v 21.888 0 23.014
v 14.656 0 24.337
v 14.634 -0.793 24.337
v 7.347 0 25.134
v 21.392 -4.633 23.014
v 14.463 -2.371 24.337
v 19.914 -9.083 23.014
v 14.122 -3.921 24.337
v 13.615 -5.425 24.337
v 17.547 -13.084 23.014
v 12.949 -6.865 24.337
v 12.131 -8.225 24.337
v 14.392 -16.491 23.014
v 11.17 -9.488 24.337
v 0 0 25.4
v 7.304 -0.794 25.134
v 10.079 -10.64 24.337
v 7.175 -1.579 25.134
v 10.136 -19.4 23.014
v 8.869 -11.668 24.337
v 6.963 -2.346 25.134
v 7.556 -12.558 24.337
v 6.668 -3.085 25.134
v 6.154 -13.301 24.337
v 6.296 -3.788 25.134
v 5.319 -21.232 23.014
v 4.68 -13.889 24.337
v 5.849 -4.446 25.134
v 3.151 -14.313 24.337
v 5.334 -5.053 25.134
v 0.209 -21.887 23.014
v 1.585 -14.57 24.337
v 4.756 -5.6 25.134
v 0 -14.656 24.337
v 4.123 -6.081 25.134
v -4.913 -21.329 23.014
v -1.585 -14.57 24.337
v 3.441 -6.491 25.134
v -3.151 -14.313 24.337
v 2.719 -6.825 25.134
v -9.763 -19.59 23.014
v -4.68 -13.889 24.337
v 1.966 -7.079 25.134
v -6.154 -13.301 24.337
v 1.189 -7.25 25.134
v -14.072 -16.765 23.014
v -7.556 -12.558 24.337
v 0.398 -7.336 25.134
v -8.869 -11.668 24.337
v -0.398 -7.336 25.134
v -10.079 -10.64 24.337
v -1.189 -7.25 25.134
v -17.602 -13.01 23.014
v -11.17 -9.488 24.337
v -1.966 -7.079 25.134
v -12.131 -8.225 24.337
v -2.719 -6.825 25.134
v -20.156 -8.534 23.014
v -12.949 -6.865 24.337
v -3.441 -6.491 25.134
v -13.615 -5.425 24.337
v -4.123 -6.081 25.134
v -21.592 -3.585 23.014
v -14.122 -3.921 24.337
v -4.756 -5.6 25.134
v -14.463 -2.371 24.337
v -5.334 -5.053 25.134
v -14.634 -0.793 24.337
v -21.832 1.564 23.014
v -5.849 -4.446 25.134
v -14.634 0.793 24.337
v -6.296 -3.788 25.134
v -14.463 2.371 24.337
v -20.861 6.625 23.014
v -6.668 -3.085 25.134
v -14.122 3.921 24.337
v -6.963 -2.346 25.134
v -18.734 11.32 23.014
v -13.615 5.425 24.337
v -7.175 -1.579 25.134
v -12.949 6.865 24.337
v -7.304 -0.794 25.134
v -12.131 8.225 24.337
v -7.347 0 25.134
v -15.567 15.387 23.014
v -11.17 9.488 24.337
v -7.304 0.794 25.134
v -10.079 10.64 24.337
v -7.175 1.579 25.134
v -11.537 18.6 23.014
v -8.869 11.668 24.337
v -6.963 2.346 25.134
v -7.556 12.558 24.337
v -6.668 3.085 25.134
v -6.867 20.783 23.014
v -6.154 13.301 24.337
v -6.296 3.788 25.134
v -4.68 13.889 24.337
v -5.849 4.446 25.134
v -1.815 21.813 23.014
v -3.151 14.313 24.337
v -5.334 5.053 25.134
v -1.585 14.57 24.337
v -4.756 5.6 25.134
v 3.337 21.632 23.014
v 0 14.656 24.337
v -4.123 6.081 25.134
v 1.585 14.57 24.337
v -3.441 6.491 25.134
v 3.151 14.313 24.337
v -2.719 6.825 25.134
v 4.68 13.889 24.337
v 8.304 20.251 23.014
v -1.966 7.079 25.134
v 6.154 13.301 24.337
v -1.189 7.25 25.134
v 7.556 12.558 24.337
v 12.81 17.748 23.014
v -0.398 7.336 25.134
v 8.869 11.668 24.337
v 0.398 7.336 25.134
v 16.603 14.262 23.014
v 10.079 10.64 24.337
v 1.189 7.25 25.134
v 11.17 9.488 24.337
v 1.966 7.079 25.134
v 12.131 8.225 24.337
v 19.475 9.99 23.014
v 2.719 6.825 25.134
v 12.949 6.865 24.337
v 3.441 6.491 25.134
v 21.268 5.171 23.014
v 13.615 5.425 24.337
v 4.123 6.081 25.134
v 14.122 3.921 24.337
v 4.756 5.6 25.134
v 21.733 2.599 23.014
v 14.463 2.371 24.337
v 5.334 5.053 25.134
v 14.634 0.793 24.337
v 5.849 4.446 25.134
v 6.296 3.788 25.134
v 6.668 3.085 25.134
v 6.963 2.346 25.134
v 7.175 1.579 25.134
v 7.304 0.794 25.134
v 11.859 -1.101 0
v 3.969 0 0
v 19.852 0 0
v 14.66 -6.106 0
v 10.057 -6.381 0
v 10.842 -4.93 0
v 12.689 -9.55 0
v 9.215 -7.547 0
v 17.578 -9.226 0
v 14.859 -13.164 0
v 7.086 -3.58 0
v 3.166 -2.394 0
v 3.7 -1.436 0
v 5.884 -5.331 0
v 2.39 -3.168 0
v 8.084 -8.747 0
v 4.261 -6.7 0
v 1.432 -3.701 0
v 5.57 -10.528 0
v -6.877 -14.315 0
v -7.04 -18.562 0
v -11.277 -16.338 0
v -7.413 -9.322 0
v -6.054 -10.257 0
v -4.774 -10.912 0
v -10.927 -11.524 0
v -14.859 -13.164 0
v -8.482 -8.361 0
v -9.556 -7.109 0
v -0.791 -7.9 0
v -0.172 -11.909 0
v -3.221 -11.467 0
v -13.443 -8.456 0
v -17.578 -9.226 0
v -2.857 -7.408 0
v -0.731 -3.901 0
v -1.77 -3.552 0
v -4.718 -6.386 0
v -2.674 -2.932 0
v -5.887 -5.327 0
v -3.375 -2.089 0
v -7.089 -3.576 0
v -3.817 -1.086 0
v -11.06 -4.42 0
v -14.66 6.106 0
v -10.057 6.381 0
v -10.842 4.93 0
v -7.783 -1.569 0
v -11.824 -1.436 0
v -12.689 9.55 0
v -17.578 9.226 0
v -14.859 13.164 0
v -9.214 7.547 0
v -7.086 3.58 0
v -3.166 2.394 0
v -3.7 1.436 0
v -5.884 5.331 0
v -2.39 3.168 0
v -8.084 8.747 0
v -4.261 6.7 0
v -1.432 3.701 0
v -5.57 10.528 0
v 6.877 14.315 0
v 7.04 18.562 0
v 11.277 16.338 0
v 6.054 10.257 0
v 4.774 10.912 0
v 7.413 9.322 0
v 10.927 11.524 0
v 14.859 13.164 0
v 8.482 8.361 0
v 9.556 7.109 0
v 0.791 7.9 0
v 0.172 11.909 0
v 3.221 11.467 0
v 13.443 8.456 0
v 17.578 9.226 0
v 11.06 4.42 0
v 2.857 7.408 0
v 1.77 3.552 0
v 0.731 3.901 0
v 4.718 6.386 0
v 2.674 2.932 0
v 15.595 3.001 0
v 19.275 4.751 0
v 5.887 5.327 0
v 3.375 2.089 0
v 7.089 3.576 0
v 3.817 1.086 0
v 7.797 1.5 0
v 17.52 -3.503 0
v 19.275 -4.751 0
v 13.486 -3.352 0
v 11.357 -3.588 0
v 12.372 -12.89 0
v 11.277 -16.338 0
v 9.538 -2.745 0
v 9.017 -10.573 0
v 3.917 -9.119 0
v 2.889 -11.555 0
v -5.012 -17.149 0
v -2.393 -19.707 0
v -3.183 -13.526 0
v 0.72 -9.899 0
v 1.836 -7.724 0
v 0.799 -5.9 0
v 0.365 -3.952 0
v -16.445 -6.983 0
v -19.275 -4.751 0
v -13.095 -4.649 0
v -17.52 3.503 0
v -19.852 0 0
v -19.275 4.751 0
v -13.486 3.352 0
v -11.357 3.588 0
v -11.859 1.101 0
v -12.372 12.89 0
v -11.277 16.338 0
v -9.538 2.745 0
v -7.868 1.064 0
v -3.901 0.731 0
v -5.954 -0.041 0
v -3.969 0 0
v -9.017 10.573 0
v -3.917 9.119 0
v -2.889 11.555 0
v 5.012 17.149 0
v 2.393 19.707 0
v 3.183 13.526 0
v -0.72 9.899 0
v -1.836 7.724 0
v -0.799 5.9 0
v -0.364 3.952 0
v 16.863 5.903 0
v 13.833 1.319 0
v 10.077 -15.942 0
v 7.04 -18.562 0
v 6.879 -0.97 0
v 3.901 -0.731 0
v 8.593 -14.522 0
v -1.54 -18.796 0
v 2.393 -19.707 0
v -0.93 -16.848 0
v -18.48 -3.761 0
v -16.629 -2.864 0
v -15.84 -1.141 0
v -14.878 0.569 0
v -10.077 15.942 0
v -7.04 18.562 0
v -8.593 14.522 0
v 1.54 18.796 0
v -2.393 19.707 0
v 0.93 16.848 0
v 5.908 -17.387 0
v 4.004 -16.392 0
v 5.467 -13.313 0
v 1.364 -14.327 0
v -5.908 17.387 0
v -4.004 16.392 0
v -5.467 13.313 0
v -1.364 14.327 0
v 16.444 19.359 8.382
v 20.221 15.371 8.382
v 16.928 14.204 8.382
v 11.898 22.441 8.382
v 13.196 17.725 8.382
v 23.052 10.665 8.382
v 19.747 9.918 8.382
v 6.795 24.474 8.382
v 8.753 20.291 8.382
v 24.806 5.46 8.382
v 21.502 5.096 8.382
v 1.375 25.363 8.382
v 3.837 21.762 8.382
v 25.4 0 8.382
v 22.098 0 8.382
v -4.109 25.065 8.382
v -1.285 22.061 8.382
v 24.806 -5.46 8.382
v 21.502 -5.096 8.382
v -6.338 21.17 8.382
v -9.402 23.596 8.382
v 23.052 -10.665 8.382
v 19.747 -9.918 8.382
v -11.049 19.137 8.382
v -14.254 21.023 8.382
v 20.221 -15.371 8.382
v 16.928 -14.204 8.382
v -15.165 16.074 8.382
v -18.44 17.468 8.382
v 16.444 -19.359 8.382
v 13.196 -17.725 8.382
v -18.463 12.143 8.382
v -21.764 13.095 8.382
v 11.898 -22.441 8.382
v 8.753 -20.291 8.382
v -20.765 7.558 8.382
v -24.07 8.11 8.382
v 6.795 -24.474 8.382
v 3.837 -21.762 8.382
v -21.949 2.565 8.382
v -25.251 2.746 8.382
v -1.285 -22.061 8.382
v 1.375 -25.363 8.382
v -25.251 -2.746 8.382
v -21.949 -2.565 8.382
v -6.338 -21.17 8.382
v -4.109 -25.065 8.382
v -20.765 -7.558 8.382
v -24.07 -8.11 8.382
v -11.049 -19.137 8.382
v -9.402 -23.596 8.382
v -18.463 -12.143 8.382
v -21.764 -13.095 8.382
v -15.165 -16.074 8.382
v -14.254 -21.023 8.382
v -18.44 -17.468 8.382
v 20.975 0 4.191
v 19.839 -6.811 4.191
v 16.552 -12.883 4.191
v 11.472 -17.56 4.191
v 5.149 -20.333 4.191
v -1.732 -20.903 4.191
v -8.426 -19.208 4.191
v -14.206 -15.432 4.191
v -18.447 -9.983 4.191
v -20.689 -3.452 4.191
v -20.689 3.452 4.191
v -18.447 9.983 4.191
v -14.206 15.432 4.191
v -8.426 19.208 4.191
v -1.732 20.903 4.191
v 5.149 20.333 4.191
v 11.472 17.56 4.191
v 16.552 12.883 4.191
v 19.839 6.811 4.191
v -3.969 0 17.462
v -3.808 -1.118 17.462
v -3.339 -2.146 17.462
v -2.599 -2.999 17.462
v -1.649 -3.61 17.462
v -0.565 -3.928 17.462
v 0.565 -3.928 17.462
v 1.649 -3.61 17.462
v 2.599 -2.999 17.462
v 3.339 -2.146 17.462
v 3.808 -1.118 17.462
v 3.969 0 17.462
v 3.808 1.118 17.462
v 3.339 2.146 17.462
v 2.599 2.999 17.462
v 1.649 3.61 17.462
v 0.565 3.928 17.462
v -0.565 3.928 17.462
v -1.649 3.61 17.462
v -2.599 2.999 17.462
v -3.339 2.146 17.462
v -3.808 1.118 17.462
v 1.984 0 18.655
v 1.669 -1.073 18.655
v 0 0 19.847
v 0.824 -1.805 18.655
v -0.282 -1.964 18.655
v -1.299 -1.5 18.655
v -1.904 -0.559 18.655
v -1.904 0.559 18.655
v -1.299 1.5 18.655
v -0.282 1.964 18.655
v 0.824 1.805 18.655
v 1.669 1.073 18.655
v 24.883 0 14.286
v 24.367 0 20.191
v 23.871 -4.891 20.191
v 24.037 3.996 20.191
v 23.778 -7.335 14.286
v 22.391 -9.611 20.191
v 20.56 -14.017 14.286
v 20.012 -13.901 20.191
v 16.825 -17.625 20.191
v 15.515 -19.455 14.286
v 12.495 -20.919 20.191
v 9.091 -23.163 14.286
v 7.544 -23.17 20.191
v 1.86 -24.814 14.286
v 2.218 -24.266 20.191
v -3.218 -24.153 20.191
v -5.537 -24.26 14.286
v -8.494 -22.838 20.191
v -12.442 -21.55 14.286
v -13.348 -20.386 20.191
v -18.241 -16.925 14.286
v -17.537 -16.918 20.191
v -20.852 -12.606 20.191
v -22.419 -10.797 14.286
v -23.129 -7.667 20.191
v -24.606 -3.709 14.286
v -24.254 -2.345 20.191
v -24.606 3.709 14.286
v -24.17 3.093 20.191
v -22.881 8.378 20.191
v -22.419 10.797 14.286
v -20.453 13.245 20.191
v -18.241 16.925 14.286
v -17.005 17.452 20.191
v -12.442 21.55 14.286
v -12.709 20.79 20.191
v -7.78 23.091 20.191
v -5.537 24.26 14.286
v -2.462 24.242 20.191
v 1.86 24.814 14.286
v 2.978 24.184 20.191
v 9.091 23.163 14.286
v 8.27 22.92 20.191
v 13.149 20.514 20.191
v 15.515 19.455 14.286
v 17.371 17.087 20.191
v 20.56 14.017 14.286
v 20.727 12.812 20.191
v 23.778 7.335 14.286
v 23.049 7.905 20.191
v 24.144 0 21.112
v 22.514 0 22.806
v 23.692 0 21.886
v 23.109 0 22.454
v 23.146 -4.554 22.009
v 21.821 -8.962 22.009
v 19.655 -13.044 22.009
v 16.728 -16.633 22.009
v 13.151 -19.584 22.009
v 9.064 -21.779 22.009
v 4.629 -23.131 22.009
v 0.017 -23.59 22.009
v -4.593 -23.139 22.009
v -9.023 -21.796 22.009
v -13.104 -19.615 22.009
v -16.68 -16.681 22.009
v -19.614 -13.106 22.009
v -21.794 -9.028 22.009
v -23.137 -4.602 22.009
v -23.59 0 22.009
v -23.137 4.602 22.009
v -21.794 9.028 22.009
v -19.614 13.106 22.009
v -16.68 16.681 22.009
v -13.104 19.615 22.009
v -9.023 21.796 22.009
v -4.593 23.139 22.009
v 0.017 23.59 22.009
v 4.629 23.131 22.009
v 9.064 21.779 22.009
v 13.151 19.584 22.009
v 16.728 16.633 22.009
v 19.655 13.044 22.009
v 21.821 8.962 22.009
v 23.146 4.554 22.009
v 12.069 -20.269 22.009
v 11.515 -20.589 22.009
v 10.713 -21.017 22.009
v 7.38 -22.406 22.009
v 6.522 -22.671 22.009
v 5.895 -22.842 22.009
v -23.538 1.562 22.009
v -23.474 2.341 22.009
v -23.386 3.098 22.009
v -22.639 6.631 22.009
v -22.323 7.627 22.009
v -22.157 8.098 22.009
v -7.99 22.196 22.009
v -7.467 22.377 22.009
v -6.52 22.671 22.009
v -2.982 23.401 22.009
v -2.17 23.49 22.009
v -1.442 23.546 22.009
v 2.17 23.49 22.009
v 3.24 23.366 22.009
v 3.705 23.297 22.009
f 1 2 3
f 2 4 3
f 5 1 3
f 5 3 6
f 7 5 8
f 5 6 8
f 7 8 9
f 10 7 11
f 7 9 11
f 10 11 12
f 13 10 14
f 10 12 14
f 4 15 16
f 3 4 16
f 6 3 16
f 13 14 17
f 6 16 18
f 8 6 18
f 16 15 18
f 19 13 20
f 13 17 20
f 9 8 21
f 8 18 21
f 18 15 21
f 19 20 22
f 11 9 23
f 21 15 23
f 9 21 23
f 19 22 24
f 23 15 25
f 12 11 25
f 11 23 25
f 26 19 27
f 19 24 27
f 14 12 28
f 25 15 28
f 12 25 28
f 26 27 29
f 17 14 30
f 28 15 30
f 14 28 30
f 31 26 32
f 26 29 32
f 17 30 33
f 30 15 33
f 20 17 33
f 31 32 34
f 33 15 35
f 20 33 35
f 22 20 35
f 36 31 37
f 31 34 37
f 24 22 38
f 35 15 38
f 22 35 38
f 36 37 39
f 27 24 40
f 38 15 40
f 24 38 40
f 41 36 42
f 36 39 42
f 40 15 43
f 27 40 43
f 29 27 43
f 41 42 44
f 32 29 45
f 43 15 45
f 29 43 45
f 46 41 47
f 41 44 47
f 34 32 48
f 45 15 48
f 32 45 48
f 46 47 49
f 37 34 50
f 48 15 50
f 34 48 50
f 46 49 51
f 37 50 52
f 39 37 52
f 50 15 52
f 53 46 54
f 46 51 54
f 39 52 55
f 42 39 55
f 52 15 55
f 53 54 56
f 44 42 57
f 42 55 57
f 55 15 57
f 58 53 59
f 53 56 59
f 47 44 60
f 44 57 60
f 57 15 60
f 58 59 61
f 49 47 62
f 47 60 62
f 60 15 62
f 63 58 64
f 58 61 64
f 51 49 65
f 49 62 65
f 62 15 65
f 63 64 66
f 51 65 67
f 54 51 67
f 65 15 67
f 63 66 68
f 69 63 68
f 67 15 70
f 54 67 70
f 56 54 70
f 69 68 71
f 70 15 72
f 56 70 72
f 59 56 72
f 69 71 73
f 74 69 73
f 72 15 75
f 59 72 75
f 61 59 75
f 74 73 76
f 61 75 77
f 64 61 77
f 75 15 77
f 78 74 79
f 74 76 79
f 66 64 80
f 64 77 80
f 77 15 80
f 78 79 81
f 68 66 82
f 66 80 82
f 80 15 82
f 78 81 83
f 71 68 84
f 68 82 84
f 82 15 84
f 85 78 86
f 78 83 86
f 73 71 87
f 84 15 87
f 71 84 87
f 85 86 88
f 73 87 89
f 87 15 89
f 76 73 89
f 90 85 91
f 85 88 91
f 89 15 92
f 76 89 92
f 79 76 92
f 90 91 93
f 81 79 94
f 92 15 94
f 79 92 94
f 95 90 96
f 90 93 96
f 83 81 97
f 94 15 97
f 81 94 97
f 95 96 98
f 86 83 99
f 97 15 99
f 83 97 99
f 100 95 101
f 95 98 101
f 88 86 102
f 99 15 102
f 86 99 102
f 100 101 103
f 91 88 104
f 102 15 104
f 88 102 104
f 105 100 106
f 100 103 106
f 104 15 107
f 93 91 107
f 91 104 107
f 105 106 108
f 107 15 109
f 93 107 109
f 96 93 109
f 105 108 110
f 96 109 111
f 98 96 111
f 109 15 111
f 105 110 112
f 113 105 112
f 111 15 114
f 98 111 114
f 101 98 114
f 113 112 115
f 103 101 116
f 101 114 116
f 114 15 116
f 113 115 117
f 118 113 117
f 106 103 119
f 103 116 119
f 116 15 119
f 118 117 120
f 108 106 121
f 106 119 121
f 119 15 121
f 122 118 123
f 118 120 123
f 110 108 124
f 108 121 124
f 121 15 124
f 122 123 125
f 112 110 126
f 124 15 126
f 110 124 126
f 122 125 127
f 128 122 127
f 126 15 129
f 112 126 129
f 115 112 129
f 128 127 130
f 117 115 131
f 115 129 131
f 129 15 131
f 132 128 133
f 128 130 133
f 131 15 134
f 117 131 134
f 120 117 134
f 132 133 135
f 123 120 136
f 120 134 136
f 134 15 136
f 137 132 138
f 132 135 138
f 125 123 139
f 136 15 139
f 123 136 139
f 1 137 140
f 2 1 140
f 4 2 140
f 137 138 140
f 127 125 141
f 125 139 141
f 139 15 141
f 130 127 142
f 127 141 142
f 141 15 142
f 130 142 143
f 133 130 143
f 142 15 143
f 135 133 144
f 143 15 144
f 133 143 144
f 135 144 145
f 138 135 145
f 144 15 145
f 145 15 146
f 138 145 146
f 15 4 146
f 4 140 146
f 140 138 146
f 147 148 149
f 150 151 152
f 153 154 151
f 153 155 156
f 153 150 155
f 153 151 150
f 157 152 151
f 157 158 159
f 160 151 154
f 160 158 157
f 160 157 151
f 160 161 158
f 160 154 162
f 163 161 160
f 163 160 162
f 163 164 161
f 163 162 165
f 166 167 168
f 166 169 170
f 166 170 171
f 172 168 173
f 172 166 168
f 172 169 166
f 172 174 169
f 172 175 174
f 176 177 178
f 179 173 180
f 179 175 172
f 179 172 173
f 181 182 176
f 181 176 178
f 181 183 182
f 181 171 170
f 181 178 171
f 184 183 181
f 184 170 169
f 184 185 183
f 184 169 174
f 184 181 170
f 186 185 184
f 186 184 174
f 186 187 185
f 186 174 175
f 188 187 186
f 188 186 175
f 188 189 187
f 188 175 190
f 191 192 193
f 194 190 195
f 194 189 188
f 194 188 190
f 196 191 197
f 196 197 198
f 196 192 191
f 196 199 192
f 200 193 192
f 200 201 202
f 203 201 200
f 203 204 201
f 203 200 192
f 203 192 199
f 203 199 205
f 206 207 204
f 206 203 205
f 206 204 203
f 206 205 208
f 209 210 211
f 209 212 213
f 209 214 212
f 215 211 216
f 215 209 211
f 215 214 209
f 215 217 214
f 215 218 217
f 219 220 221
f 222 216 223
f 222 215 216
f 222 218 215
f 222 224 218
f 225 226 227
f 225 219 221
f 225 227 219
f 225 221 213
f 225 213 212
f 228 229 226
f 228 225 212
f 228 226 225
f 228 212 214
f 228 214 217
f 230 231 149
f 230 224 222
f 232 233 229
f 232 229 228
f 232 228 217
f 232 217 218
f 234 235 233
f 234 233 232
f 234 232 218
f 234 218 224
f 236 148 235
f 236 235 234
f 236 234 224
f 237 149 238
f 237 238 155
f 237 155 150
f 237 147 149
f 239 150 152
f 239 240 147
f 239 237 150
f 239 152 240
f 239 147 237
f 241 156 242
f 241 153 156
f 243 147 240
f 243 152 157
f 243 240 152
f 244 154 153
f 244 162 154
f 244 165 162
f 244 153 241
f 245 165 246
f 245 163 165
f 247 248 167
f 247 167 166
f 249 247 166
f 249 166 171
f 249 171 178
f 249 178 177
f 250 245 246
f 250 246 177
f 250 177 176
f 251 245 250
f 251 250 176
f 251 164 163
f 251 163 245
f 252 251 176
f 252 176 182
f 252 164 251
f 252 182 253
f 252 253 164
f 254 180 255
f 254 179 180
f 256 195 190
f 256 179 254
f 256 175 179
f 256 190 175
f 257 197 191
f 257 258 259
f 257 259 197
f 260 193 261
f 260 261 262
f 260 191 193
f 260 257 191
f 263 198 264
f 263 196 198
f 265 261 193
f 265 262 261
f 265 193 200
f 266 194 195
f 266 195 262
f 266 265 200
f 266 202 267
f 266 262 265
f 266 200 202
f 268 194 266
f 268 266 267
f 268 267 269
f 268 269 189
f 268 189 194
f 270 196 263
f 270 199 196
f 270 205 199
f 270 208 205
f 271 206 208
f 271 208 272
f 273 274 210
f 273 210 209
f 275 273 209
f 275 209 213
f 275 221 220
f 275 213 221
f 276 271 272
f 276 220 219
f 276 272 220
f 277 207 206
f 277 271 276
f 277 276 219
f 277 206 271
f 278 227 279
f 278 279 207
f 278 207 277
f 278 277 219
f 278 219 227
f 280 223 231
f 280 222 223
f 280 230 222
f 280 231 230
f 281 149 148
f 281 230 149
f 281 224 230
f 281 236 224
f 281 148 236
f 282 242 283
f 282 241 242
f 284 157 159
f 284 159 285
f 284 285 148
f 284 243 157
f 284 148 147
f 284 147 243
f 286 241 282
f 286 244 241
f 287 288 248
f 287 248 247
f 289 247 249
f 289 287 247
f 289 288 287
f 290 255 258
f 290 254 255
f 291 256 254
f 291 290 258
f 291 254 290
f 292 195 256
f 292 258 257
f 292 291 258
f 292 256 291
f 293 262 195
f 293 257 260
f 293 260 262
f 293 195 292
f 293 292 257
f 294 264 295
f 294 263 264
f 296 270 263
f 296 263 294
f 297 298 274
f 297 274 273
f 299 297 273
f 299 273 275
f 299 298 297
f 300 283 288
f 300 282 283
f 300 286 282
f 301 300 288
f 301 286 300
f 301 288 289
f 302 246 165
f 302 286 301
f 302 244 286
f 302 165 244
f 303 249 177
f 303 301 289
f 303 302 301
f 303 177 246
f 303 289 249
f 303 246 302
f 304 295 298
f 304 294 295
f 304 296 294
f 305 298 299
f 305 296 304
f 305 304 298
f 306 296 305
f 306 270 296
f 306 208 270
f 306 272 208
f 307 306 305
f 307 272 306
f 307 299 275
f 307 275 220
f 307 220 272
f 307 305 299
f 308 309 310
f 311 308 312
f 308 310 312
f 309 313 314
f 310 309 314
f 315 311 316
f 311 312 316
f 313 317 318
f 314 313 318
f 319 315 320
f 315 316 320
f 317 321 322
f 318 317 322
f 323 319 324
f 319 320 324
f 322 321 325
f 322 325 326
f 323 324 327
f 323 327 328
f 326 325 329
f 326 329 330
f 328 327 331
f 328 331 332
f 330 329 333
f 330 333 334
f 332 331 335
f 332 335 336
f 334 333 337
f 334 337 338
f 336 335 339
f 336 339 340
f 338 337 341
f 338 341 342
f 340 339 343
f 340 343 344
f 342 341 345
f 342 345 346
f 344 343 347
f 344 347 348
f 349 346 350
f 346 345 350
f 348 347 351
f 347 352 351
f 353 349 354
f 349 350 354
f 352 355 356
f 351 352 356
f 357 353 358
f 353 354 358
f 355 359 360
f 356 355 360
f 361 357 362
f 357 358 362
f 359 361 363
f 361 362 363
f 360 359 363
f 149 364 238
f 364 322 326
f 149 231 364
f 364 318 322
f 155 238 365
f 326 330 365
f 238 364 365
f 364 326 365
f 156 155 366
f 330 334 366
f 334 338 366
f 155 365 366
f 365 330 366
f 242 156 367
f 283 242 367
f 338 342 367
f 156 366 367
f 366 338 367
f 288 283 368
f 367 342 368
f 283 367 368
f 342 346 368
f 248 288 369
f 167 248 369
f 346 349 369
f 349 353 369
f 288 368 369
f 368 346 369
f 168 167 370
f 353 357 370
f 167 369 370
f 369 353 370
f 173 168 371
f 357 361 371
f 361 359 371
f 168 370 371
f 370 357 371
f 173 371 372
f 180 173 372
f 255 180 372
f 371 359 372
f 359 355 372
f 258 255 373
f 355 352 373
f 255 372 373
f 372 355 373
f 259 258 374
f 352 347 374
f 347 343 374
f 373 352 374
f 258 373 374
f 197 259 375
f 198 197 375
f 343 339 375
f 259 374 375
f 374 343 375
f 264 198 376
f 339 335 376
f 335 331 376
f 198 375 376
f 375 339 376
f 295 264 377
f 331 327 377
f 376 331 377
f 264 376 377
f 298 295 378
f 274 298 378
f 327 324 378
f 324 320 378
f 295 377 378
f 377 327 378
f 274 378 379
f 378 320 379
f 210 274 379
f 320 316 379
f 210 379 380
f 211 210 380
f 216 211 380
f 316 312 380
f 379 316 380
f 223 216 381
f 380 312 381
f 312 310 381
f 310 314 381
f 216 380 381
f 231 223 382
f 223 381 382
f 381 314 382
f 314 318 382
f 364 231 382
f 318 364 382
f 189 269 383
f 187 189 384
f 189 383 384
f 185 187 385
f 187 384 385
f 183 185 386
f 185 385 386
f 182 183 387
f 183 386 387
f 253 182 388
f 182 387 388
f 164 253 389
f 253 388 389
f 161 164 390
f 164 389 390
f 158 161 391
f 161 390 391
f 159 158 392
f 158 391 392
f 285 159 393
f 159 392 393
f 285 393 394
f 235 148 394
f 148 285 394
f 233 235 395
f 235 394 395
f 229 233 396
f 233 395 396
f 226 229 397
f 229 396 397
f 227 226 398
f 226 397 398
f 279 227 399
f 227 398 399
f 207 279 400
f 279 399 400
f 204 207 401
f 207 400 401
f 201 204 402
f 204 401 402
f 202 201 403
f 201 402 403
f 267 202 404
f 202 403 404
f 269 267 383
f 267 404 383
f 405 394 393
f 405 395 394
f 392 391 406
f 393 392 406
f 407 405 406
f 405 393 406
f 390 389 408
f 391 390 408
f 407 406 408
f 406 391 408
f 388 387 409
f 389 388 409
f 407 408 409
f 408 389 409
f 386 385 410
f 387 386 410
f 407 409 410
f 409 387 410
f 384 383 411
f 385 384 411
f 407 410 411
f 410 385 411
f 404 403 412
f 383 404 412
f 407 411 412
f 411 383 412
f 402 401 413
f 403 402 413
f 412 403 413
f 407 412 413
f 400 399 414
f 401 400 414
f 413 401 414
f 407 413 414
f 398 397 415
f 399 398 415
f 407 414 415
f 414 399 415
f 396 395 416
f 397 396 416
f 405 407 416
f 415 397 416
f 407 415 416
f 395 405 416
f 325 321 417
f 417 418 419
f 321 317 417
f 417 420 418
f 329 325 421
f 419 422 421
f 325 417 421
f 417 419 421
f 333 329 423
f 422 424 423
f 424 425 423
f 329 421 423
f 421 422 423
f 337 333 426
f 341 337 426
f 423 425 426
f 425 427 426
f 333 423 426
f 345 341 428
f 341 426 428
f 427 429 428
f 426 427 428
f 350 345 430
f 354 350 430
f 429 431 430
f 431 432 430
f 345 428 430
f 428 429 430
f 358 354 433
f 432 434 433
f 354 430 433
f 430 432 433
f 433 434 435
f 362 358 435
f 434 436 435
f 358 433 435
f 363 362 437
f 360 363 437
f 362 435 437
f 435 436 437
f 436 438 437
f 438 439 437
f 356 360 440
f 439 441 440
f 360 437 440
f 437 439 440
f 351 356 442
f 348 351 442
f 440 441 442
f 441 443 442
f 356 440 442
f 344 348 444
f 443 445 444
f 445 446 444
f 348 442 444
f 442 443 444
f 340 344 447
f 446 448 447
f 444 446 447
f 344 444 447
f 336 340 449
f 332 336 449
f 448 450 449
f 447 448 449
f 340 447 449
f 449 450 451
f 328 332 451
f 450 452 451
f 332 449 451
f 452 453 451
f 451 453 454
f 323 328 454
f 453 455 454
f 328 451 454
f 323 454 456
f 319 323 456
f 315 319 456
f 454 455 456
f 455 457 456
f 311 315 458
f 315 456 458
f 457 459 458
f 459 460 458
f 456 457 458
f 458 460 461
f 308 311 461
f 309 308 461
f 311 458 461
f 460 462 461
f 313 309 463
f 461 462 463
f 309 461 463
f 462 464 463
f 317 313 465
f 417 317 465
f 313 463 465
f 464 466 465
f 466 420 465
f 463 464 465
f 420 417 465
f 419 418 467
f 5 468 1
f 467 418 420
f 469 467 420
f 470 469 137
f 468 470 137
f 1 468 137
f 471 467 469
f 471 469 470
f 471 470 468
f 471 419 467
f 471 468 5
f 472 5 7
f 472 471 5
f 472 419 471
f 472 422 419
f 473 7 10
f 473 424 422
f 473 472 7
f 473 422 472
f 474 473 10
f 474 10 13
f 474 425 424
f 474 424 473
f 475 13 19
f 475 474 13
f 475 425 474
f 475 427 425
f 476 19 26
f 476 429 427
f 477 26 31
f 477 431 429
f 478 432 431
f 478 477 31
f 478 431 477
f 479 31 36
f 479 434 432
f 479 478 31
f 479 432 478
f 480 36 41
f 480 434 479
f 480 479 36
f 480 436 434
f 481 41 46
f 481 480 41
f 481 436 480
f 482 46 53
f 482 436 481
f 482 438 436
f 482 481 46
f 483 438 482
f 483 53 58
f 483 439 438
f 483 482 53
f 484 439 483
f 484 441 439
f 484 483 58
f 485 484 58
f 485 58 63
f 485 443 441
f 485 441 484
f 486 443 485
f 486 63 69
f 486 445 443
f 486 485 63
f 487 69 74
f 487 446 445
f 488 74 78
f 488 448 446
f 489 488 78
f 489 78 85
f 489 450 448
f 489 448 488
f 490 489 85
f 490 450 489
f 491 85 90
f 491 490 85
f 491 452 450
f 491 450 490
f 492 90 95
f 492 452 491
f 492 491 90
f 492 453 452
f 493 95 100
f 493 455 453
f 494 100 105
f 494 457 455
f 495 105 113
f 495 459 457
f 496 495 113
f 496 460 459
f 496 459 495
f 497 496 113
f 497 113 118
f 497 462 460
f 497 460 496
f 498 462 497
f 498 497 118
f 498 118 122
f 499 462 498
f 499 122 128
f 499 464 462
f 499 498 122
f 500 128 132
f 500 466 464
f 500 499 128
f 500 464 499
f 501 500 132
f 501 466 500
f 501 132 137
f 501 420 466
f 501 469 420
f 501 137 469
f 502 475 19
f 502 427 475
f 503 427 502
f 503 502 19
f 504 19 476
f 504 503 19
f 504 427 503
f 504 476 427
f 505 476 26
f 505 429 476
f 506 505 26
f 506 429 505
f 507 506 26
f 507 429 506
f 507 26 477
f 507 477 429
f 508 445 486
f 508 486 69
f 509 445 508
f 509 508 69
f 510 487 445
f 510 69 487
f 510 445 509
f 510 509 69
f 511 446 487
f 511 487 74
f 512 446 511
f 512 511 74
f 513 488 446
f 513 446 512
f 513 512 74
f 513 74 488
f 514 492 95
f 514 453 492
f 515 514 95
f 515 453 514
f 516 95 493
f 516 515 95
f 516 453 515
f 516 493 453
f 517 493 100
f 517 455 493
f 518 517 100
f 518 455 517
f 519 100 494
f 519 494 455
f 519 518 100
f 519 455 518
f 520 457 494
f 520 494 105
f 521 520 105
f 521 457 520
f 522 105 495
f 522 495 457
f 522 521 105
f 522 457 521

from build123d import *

# Parameters (mm, degrees)
F3_D     = 7.9375
F3_DEPTH = 17.4625
F3_TIP   = 2.3846655818
F4_R     = 3.175


with BuildPart() as f1:
    # F0 (on Front) → F1 (revolve)
    with BuildSketch(Plane.XZ):
        with BuildLine():
            add(Edge.make_bspline(
                [(19.852049869, 0), (13.2346999127, 0), (6.6173499563, 0), (0, 0)],
                knots=[0, 0, 0, 0, 0.5, 0.5, 0.5, 0.5], degree=3))
            Line((19.852049869, 0), (22.098, 8.382))
            Line((22.098, 8.382), (25.4, 8.382))
            Line((25.4, 8.382), (24.1662252473, 22.4841099534))
            ThreePointArc((24.1662252473, 22.4841099534), (12.1707524158, 24.6683933927), (0, 25.4))
            Line((0, 25.4), (0, 0))
        make_face()
    revolve(axis=Axis((0, 0, 12.7), (0, 0, -1)))

    # F3
    with Locations(Plane(origin=(0, 0, 0), x_dir=(1, 0, 0), z_dir=(0, 0, -1))):
        with Locations((0, 0)):
            Hole(F3_D / 2, depth=F3_DEPTH)
            with Locations((0, 0, -(F3_DEPTH + F3_TIP / 2))):  # 118° drill point
                Cone(0, F3_D / 2, F3_TIP, mode=Mode.SUBTRACT)

    # F4
    f4_edges = [f1.edges().sort_by_distance(p)[0] for p in [
        (-24.166225, 0, 22.48411),
    ]]
    fillet(f4_edges, radius=F4_R)


solid = f1.part
